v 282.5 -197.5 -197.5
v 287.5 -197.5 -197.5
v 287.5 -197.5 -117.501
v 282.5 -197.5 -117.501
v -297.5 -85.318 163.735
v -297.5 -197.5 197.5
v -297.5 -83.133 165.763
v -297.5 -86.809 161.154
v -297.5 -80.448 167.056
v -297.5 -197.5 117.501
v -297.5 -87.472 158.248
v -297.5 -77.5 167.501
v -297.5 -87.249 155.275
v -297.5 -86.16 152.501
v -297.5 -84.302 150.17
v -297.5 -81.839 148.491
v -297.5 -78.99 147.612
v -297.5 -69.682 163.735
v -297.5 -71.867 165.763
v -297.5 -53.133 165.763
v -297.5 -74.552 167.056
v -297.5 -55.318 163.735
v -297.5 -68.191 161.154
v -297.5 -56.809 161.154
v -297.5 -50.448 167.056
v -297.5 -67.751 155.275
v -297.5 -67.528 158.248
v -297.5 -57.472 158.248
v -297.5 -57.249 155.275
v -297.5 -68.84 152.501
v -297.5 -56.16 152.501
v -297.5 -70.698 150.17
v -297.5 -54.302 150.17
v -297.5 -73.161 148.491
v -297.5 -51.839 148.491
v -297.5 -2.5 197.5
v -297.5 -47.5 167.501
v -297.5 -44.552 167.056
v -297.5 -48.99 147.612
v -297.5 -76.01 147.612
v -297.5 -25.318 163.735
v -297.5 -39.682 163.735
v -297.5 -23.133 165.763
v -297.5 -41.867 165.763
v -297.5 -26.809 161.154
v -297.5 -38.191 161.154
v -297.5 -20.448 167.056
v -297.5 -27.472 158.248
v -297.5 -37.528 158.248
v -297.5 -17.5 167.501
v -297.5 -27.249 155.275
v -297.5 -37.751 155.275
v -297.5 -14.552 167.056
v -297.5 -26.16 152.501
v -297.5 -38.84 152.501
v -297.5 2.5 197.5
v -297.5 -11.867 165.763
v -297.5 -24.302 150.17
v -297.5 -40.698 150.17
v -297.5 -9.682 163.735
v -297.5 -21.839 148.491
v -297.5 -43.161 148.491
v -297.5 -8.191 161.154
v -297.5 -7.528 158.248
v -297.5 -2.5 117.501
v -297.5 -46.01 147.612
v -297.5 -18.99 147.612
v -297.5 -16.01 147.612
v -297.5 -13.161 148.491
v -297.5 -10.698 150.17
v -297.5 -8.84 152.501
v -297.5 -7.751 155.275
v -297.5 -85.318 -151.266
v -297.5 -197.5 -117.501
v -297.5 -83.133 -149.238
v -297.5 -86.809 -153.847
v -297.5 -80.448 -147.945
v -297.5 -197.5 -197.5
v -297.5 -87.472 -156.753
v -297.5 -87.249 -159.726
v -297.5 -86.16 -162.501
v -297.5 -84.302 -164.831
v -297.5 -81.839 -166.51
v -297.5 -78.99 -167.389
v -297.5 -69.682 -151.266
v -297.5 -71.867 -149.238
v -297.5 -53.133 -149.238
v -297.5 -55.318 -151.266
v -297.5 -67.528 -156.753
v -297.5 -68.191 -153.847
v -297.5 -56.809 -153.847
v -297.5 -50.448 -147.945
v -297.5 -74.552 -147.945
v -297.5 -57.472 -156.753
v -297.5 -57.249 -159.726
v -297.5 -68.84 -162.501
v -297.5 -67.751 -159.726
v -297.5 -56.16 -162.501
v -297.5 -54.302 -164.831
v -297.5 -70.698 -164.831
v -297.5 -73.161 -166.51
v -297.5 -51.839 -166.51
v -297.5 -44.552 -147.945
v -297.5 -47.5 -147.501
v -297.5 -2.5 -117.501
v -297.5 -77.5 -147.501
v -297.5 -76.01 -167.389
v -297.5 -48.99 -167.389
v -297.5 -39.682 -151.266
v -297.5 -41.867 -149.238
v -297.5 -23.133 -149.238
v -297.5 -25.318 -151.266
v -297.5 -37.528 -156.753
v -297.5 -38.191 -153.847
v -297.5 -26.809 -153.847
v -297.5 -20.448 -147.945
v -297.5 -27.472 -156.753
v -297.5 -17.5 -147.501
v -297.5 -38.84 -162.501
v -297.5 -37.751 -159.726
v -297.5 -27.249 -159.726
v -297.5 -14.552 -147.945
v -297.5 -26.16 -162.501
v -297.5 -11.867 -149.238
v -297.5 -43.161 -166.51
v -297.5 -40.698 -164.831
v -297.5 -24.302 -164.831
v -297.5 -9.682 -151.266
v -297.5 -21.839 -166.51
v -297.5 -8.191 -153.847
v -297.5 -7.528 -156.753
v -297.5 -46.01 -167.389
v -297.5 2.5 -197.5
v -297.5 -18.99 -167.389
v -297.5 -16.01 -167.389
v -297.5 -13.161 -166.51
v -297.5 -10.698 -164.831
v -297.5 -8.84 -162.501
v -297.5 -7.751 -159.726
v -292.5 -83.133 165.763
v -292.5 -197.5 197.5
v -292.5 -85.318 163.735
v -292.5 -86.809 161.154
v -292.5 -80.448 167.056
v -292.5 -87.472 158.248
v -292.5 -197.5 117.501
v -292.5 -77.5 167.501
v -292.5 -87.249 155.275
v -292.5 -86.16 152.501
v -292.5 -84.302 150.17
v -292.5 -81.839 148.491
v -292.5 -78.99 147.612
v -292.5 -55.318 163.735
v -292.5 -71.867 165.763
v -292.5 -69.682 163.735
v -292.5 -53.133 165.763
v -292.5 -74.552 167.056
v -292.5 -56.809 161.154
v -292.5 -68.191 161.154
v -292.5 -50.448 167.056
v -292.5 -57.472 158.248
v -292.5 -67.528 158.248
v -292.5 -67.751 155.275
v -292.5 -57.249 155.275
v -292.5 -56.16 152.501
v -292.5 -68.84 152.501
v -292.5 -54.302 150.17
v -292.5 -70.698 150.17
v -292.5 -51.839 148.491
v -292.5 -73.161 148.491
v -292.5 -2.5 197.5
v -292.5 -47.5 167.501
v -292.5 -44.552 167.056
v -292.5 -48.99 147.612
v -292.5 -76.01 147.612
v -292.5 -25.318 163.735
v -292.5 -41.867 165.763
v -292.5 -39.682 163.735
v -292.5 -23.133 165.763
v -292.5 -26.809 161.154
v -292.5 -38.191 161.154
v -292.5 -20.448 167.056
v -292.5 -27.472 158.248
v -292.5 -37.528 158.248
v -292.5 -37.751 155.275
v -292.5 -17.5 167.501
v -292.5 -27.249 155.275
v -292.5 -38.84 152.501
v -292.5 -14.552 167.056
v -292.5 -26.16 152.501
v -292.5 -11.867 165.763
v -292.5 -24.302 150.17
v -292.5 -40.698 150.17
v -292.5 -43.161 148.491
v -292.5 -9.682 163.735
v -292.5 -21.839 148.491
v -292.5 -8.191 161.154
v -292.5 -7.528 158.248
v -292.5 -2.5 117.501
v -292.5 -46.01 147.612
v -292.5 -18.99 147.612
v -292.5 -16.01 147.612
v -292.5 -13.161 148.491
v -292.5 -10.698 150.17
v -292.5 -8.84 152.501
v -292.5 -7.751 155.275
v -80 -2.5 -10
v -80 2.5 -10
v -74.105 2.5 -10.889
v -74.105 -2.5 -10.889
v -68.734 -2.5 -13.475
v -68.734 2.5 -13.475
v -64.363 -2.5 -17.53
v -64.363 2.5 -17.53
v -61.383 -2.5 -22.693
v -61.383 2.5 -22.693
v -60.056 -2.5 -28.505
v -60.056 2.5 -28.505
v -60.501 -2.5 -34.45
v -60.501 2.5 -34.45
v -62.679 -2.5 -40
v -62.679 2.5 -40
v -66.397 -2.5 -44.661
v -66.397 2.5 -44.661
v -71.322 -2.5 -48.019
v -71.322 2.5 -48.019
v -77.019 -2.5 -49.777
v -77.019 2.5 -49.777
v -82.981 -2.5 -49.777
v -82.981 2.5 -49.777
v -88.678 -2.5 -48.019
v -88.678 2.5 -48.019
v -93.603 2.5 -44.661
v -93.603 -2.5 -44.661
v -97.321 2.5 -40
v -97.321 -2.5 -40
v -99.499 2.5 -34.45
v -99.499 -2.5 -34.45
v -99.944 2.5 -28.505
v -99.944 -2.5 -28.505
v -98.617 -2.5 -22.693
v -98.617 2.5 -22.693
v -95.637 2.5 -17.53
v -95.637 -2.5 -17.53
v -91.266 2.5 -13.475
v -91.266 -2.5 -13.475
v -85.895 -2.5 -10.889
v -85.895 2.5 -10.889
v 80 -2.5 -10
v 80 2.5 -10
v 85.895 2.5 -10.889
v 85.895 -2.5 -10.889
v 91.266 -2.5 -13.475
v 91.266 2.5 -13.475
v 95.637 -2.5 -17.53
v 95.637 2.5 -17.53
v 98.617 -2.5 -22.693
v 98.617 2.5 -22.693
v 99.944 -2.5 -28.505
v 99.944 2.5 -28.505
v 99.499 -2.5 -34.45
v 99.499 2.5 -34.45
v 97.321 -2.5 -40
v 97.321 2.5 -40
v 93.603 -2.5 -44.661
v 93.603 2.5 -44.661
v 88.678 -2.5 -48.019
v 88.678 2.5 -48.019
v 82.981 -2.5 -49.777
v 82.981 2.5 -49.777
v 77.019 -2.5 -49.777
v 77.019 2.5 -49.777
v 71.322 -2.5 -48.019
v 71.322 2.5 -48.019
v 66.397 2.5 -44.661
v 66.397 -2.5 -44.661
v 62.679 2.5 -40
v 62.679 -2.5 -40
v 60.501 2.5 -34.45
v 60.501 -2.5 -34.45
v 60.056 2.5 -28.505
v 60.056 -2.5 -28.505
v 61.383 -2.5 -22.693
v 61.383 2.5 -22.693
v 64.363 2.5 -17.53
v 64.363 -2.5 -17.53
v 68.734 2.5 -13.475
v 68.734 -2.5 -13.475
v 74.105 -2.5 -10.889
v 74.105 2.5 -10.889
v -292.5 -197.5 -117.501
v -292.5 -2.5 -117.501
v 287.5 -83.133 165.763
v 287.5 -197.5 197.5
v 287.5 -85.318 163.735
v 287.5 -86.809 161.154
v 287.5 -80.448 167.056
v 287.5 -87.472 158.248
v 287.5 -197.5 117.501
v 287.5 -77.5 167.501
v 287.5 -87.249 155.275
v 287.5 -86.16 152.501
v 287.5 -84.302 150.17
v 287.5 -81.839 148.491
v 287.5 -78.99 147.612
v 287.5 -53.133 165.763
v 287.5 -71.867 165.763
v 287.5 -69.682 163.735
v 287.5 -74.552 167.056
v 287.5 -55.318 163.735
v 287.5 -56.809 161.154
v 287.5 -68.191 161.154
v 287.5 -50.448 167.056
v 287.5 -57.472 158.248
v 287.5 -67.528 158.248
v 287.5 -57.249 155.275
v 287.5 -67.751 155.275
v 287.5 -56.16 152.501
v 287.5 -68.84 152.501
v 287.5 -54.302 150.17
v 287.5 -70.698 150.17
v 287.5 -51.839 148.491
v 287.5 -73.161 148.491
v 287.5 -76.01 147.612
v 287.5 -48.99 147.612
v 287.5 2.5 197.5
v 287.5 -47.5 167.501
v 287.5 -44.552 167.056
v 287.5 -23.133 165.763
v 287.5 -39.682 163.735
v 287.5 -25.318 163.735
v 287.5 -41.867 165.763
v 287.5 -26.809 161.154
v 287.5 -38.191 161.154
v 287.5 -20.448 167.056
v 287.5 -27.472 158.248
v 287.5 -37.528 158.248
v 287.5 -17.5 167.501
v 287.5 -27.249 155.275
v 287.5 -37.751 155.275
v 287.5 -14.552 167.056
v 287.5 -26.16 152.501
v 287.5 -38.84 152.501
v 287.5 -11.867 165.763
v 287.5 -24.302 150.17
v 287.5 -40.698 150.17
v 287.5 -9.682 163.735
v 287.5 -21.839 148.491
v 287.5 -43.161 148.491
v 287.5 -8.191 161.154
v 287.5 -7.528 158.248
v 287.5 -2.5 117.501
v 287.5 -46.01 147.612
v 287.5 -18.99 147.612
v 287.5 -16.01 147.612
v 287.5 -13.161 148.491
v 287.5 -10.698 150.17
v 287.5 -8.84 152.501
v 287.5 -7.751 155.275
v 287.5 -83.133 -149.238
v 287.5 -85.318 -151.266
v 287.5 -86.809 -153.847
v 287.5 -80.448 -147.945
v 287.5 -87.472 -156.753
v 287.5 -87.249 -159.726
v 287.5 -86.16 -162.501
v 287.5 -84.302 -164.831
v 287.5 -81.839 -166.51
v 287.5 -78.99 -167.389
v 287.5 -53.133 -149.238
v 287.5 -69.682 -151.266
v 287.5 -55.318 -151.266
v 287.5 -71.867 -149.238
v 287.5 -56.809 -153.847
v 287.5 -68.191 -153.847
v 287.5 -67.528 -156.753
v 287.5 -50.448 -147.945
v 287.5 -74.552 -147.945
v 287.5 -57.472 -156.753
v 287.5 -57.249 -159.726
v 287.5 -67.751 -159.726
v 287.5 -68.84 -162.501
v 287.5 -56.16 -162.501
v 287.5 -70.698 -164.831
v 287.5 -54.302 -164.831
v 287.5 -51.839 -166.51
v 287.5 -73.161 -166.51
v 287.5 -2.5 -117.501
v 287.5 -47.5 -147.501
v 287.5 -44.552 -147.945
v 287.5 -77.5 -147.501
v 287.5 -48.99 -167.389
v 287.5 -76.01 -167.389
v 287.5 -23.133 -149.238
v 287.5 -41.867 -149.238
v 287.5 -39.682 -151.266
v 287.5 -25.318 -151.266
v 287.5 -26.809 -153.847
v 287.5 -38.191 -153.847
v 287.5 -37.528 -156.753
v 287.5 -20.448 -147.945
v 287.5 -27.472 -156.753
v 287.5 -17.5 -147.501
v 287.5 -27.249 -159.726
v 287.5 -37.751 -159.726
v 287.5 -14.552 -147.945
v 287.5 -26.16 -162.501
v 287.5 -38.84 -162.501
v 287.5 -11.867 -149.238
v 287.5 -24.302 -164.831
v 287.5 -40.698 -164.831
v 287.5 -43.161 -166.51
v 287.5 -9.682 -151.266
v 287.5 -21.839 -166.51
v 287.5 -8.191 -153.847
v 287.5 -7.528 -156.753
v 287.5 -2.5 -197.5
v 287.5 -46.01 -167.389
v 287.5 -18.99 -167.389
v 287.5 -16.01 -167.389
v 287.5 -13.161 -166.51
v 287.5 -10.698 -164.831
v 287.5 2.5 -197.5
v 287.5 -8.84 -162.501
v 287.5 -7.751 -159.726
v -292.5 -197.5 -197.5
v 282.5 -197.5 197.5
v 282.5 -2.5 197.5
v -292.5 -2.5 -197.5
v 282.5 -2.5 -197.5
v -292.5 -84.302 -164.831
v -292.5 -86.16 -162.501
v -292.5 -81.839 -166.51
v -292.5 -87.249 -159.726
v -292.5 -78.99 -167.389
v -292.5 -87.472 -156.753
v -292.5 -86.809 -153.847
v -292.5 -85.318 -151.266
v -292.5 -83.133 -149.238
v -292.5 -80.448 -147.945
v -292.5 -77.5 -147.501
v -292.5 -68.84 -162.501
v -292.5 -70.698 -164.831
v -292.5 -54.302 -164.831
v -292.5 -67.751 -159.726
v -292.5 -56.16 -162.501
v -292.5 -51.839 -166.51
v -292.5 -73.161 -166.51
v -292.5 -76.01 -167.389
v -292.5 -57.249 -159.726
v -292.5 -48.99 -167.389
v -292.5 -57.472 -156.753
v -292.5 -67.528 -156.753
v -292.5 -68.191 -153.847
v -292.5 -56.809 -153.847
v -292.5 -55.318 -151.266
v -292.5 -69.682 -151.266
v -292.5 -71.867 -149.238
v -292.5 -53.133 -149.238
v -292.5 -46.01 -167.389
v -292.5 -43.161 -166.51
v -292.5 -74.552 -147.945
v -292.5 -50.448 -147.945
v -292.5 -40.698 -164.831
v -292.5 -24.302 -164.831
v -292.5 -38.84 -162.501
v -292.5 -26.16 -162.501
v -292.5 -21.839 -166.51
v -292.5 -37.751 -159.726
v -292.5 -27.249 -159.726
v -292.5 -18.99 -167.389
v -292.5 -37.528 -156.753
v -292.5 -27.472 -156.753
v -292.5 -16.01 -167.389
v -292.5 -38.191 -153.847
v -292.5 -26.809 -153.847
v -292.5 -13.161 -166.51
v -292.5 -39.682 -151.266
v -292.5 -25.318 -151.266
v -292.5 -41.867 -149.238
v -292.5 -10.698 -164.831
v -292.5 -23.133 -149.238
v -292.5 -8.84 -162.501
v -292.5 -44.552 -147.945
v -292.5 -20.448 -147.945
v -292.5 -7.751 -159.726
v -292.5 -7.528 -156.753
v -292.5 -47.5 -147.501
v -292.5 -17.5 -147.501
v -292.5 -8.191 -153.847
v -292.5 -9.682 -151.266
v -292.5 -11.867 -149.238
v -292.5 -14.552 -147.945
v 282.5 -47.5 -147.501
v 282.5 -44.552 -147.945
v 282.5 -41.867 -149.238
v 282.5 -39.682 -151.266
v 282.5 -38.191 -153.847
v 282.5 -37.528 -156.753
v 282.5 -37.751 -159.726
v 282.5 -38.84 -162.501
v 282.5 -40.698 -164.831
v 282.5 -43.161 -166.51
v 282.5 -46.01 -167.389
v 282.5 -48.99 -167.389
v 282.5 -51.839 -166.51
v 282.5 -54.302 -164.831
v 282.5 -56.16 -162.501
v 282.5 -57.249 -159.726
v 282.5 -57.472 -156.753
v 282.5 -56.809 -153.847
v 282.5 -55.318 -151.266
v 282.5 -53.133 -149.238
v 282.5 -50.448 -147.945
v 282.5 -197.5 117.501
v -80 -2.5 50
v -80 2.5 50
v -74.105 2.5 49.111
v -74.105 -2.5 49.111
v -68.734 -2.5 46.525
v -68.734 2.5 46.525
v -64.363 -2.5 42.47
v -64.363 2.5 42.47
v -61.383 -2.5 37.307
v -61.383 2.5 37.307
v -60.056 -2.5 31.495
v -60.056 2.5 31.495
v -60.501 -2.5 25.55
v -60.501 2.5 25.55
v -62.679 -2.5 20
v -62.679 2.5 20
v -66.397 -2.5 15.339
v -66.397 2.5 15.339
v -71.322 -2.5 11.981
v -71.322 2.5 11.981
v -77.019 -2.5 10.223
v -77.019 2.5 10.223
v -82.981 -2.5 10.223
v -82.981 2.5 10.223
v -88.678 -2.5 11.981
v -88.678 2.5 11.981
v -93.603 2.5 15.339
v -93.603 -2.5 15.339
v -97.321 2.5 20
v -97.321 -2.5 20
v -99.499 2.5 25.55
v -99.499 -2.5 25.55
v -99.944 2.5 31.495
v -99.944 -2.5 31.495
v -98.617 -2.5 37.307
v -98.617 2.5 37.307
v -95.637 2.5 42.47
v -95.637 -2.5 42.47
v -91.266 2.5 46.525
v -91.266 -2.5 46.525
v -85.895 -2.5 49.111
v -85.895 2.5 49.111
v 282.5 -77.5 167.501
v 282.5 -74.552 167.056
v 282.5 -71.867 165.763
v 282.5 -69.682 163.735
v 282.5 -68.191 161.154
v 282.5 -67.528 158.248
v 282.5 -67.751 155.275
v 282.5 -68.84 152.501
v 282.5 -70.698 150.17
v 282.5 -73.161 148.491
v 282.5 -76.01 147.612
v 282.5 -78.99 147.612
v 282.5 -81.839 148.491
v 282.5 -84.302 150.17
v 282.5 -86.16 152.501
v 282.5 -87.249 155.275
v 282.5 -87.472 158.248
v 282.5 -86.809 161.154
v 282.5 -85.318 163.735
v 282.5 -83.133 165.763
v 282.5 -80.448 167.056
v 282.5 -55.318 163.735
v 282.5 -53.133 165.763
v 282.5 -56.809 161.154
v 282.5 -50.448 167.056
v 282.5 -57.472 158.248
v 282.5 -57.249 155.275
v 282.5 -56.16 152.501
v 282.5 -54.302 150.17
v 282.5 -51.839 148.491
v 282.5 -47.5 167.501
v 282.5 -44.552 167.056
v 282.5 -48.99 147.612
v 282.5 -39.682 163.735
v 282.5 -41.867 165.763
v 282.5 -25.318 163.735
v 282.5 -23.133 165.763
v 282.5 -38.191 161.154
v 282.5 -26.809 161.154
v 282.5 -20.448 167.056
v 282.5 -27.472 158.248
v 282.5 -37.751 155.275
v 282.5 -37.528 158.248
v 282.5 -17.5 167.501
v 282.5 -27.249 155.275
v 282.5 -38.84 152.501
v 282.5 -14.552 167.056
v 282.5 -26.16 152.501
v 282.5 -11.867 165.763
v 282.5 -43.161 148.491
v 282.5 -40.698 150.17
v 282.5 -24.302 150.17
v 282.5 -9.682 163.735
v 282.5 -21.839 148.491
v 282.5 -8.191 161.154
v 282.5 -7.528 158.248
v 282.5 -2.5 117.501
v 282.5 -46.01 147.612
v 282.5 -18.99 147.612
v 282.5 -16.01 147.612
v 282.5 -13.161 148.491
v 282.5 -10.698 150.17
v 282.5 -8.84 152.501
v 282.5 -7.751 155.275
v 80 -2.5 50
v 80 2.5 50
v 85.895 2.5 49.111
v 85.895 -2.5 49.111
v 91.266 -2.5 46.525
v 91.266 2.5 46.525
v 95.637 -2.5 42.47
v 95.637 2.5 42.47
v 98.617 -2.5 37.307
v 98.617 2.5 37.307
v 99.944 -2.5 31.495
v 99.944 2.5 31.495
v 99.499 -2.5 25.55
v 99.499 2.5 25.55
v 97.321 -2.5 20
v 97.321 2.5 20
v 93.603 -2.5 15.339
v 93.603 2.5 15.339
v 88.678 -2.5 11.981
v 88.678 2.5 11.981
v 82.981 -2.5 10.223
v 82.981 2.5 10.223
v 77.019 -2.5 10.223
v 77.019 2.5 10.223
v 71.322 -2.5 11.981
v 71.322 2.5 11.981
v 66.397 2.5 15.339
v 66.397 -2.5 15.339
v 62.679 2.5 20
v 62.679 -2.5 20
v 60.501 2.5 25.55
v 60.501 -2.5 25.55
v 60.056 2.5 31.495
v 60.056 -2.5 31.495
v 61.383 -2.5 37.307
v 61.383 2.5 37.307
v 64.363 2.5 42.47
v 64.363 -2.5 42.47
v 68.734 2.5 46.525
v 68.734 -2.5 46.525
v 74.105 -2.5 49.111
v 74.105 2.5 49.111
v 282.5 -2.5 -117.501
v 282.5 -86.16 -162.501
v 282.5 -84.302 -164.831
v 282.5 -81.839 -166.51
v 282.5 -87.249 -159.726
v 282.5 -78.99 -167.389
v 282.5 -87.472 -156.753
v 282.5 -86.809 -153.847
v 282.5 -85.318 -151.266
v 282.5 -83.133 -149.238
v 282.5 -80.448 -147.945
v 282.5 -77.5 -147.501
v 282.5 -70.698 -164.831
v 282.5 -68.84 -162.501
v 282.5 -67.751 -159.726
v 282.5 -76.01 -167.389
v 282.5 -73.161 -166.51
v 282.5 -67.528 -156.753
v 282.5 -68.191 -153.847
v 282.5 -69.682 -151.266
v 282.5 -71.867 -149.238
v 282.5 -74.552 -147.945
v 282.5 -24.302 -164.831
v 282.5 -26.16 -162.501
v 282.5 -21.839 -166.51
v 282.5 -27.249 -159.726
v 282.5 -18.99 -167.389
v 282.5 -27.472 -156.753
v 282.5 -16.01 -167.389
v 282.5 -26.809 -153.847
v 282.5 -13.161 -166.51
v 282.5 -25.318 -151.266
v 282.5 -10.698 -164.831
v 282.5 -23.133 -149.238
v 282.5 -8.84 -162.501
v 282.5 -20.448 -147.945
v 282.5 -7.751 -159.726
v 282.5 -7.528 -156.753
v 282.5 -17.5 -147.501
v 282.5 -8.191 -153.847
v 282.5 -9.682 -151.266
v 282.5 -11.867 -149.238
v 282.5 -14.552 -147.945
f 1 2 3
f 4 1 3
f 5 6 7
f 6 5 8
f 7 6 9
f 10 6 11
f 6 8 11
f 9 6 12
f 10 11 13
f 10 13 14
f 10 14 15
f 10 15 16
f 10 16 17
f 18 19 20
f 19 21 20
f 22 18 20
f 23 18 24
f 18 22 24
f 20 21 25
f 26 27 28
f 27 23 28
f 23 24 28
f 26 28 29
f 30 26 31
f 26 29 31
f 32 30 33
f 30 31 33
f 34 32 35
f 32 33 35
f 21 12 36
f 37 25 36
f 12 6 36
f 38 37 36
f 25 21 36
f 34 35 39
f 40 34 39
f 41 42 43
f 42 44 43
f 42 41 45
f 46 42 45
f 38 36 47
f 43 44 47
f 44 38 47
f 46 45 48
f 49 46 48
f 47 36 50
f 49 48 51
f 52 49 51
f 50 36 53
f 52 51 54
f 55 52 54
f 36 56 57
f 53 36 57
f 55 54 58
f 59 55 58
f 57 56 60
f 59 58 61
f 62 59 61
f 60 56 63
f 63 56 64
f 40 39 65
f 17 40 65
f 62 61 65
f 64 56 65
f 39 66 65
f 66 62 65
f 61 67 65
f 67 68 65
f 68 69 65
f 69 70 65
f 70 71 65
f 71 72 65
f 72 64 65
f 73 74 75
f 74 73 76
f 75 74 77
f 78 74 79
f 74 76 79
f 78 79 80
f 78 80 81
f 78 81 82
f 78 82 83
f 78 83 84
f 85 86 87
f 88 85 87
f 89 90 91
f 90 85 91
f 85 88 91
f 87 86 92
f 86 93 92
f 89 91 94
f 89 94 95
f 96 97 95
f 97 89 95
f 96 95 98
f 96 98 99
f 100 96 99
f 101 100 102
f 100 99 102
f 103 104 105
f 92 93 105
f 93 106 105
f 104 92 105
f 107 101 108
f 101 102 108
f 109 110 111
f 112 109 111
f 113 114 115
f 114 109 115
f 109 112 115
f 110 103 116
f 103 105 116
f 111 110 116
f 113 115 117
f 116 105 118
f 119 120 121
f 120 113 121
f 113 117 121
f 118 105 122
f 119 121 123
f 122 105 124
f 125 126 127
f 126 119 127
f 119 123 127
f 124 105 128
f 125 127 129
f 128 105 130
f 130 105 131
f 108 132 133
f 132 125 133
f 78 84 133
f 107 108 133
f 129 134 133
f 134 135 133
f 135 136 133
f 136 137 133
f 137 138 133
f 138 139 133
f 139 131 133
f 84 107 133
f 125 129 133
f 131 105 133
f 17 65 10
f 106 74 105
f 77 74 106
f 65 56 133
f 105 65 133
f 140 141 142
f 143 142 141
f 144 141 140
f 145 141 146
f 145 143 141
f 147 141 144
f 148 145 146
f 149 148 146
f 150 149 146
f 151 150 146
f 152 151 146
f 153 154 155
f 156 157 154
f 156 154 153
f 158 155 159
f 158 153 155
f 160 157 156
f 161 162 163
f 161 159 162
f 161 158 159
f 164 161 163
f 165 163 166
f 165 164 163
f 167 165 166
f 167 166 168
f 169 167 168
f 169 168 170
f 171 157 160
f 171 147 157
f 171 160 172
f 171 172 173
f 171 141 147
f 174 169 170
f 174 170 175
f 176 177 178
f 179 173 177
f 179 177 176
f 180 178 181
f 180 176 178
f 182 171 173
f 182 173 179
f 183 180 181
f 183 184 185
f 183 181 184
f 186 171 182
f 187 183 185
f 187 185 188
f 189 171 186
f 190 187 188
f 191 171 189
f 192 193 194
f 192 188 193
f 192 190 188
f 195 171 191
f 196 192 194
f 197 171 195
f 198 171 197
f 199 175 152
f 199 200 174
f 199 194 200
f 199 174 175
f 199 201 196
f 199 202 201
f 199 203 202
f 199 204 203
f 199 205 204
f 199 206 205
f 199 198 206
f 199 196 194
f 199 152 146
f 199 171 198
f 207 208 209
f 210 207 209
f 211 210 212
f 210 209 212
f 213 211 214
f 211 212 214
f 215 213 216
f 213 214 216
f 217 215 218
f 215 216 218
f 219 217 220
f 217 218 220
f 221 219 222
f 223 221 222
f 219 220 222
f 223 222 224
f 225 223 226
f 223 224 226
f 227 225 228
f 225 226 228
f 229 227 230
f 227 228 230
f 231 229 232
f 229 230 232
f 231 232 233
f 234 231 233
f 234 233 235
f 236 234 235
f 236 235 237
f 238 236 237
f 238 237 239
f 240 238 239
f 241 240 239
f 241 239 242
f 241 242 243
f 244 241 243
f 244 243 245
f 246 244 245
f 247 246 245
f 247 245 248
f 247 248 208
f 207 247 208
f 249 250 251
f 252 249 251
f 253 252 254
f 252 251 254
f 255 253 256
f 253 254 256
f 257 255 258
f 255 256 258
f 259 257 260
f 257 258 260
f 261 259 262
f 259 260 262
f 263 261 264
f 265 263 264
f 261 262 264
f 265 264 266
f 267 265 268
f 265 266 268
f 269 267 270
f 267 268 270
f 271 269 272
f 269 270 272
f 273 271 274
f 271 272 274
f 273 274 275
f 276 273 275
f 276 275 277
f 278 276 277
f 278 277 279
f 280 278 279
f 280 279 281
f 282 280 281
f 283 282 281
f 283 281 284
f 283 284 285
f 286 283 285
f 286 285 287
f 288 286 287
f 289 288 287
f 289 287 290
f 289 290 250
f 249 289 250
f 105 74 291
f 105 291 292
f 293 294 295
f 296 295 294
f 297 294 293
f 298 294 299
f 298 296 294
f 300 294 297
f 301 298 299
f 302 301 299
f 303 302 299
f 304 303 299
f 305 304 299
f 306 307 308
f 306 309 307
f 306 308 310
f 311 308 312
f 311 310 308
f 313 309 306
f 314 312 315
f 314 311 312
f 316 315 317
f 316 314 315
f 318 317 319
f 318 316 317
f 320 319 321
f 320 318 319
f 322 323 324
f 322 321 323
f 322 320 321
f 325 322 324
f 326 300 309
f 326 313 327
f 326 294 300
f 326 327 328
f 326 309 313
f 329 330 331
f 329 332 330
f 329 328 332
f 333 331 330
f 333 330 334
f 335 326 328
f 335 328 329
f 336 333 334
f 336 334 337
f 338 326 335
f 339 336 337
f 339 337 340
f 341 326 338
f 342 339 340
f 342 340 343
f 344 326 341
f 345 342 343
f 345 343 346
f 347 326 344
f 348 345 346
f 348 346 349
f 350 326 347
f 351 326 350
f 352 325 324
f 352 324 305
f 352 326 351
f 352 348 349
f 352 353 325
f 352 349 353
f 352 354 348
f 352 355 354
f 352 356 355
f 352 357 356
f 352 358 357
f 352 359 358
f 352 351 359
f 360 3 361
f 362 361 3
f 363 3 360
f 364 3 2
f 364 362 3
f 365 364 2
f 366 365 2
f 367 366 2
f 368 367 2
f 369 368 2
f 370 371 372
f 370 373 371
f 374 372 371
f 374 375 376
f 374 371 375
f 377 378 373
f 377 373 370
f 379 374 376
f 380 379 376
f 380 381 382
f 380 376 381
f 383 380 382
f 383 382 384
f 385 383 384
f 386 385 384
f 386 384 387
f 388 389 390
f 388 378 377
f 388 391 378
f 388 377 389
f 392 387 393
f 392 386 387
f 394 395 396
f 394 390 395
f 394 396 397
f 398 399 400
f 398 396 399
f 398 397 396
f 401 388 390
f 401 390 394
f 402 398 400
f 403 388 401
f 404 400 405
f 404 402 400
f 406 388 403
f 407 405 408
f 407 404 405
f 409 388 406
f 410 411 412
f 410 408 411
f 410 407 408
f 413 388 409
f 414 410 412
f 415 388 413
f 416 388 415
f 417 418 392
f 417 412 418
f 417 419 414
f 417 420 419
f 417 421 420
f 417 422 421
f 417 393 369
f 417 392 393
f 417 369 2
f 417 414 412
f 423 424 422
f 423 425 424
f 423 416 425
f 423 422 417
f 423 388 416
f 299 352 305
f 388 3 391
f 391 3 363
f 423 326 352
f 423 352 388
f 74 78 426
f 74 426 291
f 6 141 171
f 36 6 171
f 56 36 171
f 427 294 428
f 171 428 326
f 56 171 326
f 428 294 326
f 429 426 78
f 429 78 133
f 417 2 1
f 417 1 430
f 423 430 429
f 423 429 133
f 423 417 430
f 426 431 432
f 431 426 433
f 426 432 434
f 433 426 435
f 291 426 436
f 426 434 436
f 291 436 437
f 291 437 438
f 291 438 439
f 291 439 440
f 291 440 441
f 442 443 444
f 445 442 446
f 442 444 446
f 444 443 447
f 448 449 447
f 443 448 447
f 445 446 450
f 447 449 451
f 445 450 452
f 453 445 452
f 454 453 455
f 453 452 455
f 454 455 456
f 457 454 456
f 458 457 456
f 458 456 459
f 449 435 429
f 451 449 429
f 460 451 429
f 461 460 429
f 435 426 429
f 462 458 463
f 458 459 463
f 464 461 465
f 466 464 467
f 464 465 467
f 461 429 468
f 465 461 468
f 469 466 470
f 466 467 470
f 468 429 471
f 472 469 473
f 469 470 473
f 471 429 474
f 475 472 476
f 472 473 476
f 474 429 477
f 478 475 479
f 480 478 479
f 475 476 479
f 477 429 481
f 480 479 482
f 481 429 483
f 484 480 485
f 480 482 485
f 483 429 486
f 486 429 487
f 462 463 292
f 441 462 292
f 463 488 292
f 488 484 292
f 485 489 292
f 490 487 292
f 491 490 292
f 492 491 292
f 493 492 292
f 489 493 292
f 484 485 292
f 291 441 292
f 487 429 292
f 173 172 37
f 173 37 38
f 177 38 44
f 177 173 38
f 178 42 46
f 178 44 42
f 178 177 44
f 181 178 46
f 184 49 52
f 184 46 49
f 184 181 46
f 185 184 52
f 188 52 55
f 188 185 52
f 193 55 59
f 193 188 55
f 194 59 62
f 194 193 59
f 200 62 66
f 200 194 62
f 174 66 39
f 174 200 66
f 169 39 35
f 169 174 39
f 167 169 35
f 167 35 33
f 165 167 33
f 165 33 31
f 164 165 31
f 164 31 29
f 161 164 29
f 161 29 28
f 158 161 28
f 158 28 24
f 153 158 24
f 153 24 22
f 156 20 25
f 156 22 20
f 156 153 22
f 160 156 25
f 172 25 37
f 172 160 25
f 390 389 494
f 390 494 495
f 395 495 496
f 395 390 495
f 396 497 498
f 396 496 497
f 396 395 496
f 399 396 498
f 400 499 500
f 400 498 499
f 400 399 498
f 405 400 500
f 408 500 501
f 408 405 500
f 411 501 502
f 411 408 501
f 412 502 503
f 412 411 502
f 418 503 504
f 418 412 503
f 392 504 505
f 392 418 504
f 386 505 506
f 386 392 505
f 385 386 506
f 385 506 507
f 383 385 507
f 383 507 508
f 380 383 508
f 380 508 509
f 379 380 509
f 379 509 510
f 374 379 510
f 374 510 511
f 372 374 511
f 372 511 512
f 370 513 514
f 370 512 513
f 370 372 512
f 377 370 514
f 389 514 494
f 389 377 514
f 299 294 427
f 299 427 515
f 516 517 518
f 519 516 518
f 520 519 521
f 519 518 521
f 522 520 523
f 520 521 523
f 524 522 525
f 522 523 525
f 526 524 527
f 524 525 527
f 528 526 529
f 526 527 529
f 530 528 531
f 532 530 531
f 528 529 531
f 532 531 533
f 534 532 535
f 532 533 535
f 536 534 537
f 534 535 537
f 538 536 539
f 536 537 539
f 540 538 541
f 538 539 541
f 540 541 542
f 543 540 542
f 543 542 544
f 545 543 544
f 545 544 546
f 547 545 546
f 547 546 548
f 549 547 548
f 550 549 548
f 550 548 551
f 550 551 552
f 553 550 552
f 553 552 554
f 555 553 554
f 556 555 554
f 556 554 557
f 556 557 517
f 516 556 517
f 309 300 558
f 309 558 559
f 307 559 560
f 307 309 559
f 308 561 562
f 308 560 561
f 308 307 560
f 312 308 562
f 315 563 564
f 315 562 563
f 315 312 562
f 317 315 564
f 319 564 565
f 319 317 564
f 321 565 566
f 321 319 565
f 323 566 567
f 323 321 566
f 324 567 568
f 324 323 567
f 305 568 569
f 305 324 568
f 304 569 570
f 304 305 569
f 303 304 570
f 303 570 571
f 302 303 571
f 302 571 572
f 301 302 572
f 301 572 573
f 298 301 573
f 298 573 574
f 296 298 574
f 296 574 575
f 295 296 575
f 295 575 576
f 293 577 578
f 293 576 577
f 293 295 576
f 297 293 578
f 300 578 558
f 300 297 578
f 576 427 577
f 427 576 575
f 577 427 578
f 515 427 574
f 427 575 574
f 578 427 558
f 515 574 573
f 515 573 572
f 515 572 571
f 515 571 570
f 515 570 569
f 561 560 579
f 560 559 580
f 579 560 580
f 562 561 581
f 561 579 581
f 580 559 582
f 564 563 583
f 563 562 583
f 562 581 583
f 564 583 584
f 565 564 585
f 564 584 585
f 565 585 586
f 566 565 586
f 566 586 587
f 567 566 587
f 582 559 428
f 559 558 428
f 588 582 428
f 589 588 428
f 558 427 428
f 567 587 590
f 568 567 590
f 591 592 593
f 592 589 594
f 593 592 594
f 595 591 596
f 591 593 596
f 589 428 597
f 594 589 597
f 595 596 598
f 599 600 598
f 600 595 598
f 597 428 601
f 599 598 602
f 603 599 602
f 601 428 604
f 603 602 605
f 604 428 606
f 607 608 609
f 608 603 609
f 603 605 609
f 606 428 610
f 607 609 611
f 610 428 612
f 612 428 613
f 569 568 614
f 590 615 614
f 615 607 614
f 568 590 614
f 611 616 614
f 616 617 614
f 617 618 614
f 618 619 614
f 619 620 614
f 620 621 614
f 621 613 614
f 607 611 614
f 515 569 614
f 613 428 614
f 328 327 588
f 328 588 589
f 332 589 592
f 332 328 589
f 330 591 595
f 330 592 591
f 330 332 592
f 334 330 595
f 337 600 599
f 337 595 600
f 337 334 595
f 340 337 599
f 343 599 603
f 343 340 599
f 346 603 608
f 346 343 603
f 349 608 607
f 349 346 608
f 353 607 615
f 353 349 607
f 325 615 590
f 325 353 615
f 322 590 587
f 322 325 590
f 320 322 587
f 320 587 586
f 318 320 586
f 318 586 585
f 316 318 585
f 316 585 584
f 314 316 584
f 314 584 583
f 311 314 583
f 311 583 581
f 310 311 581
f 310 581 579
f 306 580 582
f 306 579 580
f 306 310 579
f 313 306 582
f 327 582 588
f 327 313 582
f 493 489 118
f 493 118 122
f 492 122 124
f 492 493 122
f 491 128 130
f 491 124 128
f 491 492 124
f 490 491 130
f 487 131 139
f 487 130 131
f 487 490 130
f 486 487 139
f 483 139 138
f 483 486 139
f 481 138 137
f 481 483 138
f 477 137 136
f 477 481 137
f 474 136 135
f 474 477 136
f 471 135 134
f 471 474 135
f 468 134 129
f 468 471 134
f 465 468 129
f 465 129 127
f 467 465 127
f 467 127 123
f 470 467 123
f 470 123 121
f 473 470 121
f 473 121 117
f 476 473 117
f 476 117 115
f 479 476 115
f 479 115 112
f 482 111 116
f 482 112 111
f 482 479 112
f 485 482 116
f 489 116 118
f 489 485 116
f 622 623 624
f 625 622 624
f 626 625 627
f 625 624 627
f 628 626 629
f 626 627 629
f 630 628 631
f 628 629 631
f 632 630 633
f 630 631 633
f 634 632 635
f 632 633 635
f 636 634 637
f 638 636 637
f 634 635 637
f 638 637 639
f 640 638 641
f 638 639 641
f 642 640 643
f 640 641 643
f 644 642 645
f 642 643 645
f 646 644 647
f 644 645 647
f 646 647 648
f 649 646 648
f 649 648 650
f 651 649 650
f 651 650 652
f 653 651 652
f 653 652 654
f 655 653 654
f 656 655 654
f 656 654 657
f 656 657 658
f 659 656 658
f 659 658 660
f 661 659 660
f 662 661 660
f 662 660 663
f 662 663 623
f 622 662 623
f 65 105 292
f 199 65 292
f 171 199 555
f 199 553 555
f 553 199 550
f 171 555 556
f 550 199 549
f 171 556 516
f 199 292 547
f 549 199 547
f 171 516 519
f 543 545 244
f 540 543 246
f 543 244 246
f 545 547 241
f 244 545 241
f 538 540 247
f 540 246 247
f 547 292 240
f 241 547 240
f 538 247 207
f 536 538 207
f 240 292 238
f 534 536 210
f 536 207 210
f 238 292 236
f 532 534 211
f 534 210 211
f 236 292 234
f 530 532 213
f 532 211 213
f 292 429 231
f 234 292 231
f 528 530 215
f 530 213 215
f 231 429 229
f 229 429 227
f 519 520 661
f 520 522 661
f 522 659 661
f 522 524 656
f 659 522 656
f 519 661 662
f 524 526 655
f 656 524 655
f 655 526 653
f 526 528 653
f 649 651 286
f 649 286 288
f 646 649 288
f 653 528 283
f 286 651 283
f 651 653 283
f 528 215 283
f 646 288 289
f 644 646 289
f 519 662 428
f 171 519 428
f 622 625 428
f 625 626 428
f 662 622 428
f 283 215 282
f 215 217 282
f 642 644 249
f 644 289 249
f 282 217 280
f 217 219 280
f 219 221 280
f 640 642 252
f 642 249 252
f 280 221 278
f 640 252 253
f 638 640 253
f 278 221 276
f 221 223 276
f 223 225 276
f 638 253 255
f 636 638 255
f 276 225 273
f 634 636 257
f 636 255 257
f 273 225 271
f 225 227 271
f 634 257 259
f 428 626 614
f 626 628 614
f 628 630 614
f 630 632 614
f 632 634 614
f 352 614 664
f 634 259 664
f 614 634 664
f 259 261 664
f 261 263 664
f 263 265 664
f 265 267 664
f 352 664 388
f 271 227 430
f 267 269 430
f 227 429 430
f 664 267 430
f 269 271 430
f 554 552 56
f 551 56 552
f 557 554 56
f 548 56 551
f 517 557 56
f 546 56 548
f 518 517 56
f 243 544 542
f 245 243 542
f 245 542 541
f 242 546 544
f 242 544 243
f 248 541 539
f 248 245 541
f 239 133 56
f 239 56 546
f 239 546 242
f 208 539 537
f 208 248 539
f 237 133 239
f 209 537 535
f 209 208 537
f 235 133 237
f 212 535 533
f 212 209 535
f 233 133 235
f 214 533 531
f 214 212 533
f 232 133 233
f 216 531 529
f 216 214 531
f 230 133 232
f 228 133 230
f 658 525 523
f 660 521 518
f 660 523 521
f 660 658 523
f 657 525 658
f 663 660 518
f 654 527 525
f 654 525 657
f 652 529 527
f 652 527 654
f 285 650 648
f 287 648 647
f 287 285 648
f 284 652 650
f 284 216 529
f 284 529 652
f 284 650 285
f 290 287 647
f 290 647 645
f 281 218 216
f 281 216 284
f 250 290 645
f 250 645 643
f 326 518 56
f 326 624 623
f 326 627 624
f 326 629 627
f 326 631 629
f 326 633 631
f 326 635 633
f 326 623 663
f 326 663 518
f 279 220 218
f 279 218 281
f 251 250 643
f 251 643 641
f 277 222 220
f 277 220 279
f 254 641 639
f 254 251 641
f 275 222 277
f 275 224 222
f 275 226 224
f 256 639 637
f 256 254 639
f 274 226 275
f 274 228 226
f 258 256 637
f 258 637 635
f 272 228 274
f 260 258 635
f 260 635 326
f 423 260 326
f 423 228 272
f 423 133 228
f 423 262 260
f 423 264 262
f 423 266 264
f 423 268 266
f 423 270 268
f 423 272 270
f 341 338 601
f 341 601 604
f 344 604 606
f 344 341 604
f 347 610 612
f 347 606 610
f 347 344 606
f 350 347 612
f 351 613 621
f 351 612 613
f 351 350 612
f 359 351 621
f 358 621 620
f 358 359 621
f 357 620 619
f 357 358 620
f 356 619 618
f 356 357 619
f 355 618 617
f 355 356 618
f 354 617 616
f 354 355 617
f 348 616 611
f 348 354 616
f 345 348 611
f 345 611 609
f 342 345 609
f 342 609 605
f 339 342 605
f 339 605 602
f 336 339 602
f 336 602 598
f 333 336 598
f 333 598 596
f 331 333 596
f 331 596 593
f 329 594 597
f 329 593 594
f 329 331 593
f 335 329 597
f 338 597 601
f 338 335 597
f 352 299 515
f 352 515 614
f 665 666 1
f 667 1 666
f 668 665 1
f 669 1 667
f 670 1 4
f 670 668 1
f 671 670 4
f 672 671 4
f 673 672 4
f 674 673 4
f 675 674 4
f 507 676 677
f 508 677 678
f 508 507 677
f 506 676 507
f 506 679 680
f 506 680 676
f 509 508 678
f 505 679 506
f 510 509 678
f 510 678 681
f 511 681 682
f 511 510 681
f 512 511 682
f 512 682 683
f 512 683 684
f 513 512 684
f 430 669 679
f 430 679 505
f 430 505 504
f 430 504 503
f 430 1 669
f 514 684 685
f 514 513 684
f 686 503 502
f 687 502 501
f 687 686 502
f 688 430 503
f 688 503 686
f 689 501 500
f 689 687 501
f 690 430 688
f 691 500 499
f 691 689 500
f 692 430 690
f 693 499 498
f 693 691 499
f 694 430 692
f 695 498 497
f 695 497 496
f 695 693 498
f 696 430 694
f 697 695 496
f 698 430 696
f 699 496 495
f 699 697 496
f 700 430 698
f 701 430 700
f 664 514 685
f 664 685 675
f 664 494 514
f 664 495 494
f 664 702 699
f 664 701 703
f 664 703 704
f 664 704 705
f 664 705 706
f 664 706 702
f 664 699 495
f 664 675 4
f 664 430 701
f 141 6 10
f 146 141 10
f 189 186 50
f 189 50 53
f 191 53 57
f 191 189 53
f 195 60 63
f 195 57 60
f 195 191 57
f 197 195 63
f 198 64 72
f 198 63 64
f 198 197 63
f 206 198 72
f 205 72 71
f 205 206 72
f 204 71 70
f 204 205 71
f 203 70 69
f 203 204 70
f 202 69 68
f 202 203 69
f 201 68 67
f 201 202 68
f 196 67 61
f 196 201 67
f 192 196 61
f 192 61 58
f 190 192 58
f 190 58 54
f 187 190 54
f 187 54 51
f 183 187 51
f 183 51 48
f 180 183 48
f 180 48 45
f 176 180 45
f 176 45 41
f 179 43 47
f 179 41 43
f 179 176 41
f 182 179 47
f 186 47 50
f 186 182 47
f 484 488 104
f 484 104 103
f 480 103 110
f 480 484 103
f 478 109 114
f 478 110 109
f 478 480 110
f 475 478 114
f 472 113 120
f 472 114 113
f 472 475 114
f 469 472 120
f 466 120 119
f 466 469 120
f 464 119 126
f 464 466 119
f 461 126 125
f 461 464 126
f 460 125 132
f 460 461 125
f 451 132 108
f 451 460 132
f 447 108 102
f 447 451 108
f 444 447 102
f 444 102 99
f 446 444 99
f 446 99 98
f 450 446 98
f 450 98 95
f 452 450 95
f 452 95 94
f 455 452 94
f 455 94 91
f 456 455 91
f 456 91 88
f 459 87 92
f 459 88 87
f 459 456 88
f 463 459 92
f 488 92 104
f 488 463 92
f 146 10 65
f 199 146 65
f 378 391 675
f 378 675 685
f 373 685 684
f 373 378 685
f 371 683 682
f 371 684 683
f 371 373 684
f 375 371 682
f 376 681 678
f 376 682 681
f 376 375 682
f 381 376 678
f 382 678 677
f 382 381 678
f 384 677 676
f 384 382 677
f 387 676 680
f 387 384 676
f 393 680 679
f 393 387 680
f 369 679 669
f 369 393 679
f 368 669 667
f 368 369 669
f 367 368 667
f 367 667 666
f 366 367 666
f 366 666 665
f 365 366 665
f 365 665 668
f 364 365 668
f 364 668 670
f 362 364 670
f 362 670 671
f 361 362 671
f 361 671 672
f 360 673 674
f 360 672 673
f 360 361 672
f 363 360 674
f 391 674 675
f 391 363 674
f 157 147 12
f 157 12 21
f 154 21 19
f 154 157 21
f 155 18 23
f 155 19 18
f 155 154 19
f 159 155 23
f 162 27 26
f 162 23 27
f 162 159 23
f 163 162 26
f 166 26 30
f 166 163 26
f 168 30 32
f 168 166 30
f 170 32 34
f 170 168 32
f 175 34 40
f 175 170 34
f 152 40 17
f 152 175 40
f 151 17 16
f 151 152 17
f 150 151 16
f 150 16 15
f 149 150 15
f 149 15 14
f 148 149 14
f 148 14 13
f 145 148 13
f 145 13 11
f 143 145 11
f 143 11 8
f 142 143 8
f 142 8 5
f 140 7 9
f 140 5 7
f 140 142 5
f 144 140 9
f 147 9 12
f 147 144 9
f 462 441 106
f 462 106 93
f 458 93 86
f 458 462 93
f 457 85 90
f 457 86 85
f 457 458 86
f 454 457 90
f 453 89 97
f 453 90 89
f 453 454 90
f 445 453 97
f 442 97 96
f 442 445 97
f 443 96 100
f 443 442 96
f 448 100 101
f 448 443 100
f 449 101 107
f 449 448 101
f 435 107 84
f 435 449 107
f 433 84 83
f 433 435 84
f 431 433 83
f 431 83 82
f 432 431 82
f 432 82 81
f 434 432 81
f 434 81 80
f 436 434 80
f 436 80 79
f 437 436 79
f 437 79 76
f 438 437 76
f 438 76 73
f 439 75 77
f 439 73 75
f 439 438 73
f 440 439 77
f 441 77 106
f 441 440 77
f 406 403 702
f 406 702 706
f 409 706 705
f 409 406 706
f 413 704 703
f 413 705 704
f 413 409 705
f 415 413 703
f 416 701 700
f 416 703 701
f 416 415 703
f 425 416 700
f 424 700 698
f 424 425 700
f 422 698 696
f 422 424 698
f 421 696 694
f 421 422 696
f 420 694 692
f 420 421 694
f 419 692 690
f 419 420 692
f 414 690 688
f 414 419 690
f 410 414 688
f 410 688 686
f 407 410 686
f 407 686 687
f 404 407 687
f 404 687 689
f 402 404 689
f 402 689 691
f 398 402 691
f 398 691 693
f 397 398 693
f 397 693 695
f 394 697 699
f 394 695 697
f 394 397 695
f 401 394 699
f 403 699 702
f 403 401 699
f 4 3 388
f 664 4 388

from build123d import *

# Parameters (mm, degrees)
SKETCH1_W               = 585
SKETCH1_H               = 395
SKETCH1_W_2             = 425
SKETCH1_H_2             = 235
BOSS_EXTRUDE1_DEPTH     = 2.5
SKETCH2_W               = 79.998803747
SKETCH2_H               = 200
BOSS_EXTRUDE2_DEPTH     = 5
MIRROR5_COPY_1_SKETCH_W = 79.998803747
MIRROR5_COPY_1_SKETCH_H = 200
MIRROR5_COPY_1_DEPTH    = 5
CUT_EXTRUDE2_DEPTH      = 649.257279172
CUT_EXTRUDE2_DEPTH_BACK = 649.257279172
SKETCH5_R               = 10
SKETCH7_W               = 425
SKETCH7_H               = 235
BOSS_EXTRUDE4_DEPTH     = 5
SKETCH8_R               = 20
CUT_EXTRUDE3_DEPTH      = 10


with BuildPart() as part:
    # Sketch1 → Boss-Extrude1 (new, symmetric)
    with BuildSketch(Plane(origin=(0, 0, 0), x_dir=(1, 0, 0), z_dir=(0, 1, 0))):
        with Locations((-5, 0)):
            Rectangle(SKETCH1_W, SKETCH1_H)
        with Locations((-5, 0)):
            Rectangle(SKETCH1_W_2, SKETCH1_H_2, mode=Mode.SUBTRACT)
    extrude(amount=BOSS_EXTRUDE1_DEPTH, both=True)

    # Sketch2 → Boss-Extrude2 (add)
    with BuildSketch(Plane.ZY.offset(297.5)):
        with Locations((-157.500598126, -97.5)):
            Rectangle(SKETCH2_W, SKETCH2_H)
    boss_extrude2 = extrude(amount=-BOSS_EXTRUDE2_DEPTH)

    # Mirror1: Boss-Extrude2 across plane
    add(boss_extrude2.mirror(Plane.XY))

    # Mirror5: Boss-Extrude2 across plane
    add(boss_extrude2.mirror(Plane(origin=(-5, 0, 0), x_dir=(0, 0, 1), z_dir=(1, 0, 0))))

    # Mirror5 copy 1 sketch → Mirror5 copy 1 (add)
    with BuildSketch(Plane(origin=(287.5, 0, 0), x_dir=(0, 0, -1), z_dir=(1, 0, 0))):
        with Locations((-157.500598126, -97.5)):
            Rectangle(MIRROR5_COPY_1_SKETCH_W, MIRROR5_COPY_1_SKETCH_H)
    extrude(amount=-MIRROR5_COPY_1_DEPTH)

    # Sketch5 → Cut-Extrude2 (cut, two sides: drawn at the far end of the back side and taken through both)
    with BuildSketch(Plane.ZY.offset(297.5).offset(-CUT_EXTRUDE2_DEPTH_BACK)):
        with Locations((-157.500598127, -17.5)):
            Circle(SKETCH5_R)
        with Locations((-157.500598127, -47.5)):
            Circle(SKETCH5_R)
        with Locations((-157.500598127, -77.5)):
            Circle(SKETCH5_R)
        with Locations((157.500598127, -17.5)):
            Circle(SKETCH5_R)
        with Locations((157.500598127, -47.5)):
            Circle(SKETCH5_R)
        with Locations((157.500598127, -77.5)):
            Circle(SKETCH5_R)
    extrude(amount=CUT_EXTRUDE2_DEPTH + CUT_EXTRUDE2_DEPTH_BACK, mode=Mode.SUBTRACT)

    # Sketch7 → Boss-Extrude4 (add)
    with BuildSketch(Plane(origin=(0, 2.5, 0), x_dir=(1, 0, 0), z_dir=(0, 1, 0))):
        with Locations((-5, 0)):
            Rectangle(SKETCH7_W, SKETCH7_H)
    extrude(amount=-BOSS_EXTRUDE4_DEPTH)

    # Sketch8 → Cut-Extrude3 (cut)
    with BuildSketch(Plane(origin=(0, 2.5, 0), x_dir=(1, 0, 0), z_dir=(0, 1, 0))):
        with Locations(Location((-80, 30, 0), (0, 0, 270))):
            Circle(SKETCH8_R)
        with Locations(Location((80, 30, 0), (0, 0, 270))):
            Circle(SKETCH8_R)
        with Locations(Location((80, -30, 0), (0, 0, 270))):
            Circle(SKETCH8_R)
        with Locations(Location((-80, -30, 0), (0, 0, 270))):
            Circle(SKETCH8_R)
    extrude(amount=-CUT_EXTRUDE3_DEPTH, mode=Mode.SUBTRACT)


solid = part.part
